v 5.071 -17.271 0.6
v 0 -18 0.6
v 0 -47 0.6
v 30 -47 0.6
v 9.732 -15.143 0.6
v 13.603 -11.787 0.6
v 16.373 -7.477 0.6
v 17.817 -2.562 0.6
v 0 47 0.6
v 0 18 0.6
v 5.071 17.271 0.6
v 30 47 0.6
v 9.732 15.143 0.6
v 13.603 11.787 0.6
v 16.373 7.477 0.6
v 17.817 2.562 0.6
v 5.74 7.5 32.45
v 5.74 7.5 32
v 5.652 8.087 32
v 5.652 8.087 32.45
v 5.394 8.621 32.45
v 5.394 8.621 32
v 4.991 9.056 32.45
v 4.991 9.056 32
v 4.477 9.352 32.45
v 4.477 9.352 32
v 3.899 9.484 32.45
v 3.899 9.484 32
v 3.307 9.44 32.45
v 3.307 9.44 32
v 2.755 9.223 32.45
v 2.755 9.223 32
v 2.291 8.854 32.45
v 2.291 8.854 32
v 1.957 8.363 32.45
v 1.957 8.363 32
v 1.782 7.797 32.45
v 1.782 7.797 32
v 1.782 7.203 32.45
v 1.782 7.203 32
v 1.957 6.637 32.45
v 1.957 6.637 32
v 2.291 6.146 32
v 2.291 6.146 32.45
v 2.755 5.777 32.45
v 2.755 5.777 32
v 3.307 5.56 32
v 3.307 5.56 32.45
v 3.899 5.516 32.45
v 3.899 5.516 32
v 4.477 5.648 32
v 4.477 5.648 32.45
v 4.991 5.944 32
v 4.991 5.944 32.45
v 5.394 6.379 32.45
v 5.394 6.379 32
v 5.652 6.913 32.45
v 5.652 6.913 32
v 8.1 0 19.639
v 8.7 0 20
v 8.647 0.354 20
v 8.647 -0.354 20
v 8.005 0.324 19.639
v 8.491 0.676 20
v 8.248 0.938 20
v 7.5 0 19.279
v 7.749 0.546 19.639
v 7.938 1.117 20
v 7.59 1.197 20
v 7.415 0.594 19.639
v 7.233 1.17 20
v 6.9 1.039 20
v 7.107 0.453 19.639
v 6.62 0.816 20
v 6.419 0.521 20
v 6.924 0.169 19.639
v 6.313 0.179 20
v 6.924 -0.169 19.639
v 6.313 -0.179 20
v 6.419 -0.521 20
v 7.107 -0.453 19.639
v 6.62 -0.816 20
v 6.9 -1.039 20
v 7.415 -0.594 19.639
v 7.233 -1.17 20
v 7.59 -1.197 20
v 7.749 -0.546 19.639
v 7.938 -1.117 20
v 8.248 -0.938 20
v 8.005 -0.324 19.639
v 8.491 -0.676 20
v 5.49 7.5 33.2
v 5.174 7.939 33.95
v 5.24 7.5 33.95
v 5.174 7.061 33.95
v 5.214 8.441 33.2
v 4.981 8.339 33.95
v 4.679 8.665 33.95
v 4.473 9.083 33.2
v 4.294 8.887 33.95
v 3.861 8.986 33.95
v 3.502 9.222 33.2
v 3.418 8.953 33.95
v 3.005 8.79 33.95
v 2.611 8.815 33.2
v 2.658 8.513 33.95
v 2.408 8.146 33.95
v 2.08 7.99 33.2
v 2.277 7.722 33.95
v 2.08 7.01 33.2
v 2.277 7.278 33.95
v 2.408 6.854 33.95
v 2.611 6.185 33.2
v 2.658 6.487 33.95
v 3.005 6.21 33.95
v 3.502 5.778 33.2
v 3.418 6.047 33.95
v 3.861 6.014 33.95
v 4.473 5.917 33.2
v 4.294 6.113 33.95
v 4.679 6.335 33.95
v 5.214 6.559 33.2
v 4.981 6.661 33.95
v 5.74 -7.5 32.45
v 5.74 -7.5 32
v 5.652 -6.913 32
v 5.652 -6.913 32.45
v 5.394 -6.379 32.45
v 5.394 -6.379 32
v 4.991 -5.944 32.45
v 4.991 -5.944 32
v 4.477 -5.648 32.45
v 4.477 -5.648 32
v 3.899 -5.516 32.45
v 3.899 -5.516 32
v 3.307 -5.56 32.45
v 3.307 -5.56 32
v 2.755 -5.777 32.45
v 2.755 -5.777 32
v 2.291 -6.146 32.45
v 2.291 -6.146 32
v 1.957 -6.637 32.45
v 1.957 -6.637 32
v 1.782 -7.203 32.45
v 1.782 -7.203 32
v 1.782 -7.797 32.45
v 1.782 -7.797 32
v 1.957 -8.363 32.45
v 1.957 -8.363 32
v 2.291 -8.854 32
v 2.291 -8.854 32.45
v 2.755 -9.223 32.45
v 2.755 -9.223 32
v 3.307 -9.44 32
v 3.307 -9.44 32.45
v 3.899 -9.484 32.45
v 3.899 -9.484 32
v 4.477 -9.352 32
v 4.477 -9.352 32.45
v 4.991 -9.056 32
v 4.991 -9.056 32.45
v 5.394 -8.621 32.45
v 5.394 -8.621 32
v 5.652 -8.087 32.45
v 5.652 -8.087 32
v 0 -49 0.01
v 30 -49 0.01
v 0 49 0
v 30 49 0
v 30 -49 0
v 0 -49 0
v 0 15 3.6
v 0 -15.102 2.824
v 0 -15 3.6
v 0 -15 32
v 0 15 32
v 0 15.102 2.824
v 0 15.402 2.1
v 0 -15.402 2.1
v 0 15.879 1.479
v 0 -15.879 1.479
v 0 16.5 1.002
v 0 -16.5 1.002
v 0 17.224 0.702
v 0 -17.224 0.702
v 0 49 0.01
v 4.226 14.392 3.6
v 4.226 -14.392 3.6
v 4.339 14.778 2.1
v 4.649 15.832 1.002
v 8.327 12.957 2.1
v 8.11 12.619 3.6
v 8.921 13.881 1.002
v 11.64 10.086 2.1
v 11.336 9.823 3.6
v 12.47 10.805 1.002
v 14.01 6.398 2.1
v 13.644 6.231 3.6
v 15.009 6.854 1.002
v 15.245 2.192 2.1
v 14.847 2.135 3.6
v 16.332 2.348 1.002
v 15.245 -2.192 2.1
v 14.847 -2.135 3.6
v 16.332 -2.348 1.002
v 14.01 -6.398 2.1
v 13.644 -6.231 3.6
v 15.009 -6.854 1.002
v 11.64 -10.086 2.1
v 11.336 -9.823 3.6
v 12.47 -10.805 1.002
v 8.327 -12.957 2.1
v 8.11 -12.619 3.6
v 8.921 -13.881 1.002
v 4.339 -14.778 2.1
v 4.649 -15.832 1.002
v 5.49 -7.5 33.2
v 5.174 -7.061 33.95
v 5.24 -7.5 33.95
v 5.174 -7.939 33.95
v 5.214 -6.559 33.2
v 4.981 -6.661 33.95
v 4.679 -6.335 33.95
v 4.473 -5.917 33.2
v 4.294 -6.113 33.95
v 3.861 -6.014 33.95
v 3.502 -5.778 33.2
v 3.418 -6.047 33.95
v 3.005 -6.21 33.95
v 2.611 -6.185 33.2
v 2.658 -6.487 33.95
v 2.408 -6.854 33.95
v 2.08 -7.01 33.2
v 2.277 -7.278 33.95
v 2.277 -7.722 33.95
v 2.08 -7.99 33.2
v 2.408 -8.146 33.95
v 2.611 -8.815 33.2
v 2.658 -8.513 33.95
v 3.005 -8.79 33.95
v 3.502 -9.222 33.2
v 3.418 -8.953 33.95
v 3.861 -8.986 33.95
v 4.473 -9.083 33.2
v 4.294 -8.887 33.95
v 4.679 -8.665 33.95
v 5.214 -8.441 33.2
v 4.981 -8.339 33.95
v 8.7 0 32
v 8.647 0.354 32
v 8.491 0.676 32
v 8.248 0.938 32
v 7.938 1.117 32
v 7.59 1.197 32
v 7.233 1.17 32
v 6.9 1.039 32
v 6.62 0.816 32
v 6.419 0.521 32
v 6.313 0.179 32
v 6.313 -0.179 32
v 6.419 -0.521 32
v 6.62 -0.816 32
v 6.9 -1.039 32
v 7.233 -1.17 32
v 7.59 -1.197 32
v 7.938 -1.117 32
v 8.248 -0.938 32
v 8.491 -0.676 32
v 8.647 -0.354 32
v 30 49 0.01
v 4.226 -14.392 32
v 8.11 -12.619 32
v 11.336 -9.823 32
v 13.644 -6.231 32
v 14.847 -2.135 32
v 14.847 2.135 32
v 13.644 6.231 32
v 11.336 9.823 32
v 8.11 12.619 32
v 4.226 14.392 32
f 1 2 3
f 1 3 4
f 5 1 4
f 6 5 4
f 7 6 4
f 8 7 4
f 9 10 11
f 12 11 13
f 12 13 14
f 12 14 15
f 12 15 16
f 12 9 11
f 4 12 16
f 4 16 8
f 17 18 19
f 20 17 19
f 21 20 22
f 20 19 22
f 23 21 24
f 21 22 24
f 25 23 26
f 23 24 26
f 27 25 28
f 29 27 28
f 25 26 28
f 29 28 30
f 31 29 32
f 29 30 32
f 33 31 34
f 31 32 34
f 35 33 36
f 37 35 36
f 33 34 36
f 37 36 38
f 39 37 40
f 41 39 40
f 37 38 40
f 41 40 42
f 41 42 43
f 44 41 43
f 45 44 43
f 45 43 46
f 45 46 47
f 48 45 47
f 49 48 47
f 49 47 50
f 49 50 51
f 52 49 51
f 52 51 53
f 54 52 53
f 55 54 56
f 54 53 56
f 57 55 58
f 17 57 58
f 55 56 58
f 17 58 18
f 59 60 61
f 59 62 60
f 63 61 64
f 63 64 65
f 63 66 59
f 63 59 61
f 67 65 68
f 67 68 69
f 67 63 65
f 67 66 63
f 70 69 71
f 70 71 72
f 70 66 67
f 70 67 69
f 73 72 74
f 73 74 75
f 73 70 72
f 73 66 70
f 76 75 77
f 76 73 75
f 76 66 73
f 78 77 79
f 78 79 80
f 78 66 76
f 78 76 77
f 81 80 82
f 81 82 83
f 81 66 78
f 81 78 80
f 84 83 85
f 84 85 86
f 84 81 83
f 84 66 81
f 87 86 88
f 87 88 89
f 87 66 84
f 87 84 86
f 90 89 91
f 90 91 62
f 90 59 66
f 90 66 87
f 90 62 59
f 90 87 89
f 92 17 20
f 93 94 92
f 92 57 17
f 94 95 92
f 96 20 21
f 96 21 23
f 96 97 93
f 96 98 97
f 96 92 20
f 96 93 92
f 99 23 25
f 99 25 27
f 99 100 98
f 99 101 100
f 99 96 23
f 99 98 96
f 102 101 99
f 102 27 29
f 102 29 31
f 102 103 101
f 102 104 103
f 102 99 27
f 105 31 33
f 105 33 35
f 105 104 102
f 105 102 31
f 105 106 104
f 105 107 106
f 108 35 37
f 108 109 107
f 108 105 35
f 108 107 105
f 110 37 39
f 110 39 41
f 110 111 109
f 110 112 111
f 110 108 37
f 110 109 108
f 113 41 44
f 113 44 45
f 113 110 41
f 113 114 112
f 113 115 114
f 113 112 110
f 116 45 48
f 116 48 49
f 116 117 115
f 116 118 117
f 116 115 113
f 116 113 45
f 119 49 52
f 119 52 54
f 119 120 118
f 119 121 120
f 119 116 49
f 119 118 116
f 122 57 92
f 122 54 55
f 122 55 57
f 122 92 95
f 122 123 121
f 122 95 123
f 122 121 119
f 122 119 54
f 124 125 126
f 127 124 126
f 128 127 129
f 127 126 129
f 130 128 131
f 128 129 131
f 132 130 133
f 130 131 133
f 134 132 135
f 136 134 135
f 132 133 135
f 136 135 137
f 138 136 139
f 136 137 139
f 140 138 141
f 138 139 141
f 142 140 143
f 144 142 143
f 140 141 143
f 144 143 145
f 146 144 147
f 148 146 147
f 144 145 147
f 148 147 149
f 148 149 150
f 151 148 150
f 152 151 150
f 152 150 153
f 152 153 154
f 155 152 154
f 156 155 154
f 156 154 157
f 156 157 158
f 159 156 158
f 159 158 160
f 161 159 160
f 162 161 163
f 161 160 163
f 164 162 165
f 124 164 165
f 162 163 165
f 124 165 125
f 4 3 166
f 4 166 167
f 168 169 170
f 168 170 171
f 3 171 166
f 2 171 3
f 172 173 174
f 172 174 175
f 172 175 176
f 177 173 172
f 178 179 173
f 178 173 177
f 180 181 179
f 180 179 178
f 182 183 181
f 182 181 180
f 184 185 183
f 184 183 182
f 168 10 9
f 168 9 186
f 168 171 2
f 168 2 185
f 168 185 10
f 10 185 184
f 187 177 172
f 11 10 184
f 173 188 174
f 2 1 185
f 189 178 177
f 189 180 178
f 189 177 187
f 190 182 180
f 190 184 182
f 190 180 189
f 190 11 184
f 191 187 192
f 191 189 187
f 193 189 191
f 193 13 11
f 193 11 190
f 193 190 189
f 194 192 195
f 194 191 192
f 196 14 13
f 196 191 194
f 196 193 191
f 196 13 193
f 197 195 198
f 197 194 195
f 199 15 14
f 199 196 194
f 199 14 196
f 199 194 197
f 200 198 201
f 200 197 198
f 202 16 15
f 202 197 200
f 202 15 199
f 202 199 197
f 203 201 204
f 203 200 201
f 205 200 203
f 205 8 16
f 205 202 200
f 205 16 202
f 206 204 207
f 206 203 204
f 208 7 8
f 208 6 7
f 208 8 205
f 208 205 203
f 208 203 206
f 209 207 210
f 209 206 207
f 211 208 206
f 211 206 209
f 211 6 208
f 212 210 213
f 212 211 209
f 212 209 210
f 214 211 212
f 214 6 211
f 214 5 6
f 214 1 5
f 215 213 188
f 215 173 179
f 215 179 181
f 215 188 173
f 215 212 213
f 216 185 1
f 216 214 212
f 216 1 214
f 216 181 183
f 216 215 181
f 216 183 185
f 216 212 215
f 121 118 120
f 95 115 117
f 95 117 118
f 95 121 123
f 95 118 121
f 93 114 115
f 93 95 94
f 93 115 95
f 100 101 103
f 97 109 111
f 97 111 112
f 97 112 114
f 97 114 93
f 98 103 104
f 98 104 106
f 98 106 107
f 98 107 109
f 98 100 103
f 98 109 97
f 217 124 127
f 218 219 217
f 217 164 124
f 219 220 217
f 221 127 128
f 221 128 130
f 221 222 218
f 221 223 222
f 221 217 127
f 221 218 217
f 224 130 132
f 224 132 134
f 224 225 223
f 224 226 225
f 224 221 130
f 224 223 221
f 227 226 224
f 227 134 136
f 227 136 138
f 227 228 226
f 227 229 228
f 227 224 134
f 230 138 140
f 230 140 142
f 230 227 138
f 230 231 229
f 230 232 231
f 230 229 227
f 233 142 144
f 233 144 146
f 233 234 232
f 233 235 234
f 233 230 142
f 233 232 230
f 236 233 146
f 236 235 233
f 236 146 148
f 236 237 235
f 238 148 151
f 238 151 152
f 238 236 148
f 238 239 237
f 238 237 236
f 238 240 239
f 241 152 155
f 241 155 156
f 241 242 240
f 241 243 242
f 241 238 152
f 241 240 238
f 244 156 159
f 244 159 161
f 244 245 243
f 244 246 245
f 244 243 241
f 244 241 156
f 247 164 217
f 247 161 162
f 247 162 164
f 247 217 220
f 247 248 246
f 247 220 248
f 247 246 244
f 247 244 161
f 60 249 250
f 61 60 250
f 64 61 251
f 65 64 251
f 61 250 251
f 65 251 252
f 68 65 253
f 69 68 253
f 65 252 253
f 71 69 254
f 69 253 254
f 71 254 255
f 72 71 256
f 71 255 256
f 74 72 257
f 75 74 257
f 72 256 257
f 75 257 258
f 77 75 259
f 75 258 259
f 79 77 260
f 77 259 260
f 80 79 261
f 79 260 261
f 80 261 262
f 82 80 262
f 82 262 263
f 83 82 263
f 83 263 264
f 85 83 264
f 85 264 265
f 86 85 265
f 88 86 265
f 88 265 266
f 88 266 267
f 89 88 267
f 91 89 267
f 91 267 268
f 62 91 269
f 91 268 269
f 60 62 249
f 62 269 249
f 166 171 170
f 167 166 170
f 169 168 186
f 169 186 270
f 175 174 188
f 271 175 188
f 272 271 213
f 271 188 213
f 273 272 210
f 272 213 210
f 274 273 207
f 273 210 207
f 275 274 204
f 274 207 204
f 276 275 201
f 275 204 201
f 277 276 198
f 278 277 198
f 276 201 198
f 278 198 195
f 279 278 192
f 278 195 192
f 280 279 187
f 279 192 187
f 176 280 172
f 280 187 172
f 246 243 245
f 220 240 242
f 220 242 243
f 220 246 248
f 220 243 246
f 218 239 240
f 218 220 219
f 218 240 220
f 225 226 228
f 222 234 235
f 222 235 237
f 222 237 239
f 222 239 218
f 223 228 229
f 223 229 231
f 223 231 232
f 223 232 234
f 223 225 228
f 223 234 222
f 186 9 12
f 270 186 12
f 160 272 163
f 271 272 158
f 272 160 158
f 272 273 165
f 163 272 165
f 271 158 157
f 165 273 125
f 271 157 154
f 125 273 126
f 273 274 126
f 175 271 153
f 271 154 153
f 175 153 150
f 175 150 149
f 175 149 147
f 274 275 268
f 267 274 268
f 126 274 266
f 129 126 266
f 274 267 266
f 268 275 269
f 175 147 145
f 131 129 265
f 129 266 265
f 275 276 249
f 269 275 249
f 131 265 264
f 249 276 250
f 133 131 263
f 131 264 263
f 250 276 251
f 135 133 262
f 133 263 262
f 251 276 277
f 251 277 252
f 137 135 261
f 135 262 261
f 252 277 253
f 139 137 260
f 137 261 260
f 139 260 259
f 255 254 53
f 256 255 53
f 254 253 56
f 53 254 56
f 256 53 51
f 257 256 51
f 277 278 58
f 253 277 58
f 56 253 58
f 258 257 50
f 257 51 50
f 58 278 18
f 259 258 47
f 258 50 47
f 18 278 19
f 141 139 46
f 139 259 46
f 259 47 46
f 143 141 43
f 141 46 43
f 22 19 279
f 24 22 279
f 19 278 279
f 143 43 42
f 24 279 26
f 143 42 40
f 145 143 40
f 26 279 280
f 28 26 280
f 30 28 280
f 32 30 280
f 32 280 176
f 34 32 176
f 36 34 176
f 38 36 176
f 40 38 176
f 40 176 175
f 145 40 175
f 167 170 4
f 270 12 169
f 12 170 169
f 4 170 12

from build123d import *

# Parameters (mm, degrees)
SKETCH001_W        = 30
SKETCH001_H        = 98
PAD001_DEPTH       = 0.6
CHAMFER_1_SIZE2    = 2
CHAMFER_1_SIZE     = 0.59
CHAMFER_2_SIZE2    = 2
CHAMFER_2_SIZE     = 0.59
PAD002_DEPTH       = 32
FILLET_R           = 3
SKETCH003_R        = 1.2
HOLE_DEPTH         = 12
HOLE_TIPS_R        = 1.2
SKETCH004_R        = 1.99
PAD003_DEPTH       = 1.95
CHAMFER001_1_SIZE2 = 0.5
CHAMFER001_1_SIZE  = 1.5
CHAMFER001_2_SIZE2 = 0.5
CHAMFER001_2_SIZE  = 1.5


with BuildPart() as part:
    # Sketch001 → Pad001 (new body)
    with BuildSketch(Plane.XY):
        with Locations((15, 0)):
            Rectangle(SKETCH001_W, SKETCH001_H)
    extrude(amount=PAD001_DEPTH)

    # Chamfer 1
    chamfer_1_edges = [part.edges().sort_by_distance(p)[0] for p in [
        (15, -49, 0.6),
    ]]
    chamfer_1_side = part.faces().sort_by_distance((15, -49, 0.3))[0]
    chamfer(chamfer_1_edges, length=CHAMFER_1_SIZE, length2=CHAMFER_1_SIZE2, reference=chamfer_1_side)

    # Chamfer 2
    chamfer_2_edges = [part.edges().sort_by_distance(p)[0] for p in [
        (15, 49, 0.6),
    ]]
    chamfer_2_side = part.faces().sort_by_distance((15, 49, 0.3))[0]
    chamfer(chamfer_2_edges, length=CHAMFER_2_SIZE, length2=CHAMFER_2_SIZE2, reference=chamfer_2_side)

    # Sketch002 → Pad002 (join)
    with BuildSketch(Plane.XY):
        with BuildLine():
            Line((0, -15), (0, 15))
            ThreePointArc((0, -15), (15, 0), (0, 15))
        make_face()
    extrude(amount=PAD002_DEPTH)

    # Fillet
    fillet_edges = [part.edges().sort_by_distance(p)[0] for p in [
        (15, 0, 0.6),
    ]]
    fillet(fillet_edges, radius=FILLET_R)

    # Sketch003 (on Face9 of Fillet) → Hole (cut)
    with BuildSketch(Plane.XY.offset(32)):
        with Locations((7.5, 0)):
            Circle(SKETCH003_R)
    extrude(amount=-HOLE_DEPTH, mode=Mode.SUBTRACT)

    # Hole tips → Hole tip 1 section 0
    with BuildSketch(Plane.XY.offset(20), mode=Mode.PRIVATE) as hole_tip_1_s0:
        with Locations((7.5, 0)):
            Circle(HOLE_TIPS_R)
    loft([hole_tip_1_s0.sketch, Vertex(7.5, 0, 19.278967)], mode=Mode.SUBTRACT)

    # Sketch004 (on Face9 of Hole) → Pad003 (join)
    with BuildSketch(Plane.XY.offset(32)):
        with Locations((3.75, 7.5)):
            Circle(SKETCH004_R)
        with Locations((3.75, -7.5)):
            Circle(SKETCH004_R)
    extrude(amount=PAD003_DEPTH)

    # Chamfer001 1
    chamfer001_1_edges = [part.edges().sort_by_distance(p)[0] for p in [
        (1.76, -7.5, 33.95),
    ]]
    chamfer001_1_side = part.faces().sort_by_distance((1.76, -7.5, 32.975))[0]
    chamfer(chamfer001_1_edges, length=CHAMFER001_1_SIZE, length2=CHAMFER001_1_SIZE2, reference=chamfer001_1_side)

    # Chamfer001 2
    chamfer001_2_edges = [part.edges().sort_by_distance(p)[0] for p in [
        (1.76, 7.5, 33.95),
    ]]
    chamfer001_2_side = part.faces().sort_by_distance((1.76, 7.5, 32.975))[0]
    chamfer(chamfer001_2_edges, length=CHAMFER001_2_SIZE, length2=CHAMFER001_2_SIZE2, reference=chamfer001_2_side)


solid = part.part
